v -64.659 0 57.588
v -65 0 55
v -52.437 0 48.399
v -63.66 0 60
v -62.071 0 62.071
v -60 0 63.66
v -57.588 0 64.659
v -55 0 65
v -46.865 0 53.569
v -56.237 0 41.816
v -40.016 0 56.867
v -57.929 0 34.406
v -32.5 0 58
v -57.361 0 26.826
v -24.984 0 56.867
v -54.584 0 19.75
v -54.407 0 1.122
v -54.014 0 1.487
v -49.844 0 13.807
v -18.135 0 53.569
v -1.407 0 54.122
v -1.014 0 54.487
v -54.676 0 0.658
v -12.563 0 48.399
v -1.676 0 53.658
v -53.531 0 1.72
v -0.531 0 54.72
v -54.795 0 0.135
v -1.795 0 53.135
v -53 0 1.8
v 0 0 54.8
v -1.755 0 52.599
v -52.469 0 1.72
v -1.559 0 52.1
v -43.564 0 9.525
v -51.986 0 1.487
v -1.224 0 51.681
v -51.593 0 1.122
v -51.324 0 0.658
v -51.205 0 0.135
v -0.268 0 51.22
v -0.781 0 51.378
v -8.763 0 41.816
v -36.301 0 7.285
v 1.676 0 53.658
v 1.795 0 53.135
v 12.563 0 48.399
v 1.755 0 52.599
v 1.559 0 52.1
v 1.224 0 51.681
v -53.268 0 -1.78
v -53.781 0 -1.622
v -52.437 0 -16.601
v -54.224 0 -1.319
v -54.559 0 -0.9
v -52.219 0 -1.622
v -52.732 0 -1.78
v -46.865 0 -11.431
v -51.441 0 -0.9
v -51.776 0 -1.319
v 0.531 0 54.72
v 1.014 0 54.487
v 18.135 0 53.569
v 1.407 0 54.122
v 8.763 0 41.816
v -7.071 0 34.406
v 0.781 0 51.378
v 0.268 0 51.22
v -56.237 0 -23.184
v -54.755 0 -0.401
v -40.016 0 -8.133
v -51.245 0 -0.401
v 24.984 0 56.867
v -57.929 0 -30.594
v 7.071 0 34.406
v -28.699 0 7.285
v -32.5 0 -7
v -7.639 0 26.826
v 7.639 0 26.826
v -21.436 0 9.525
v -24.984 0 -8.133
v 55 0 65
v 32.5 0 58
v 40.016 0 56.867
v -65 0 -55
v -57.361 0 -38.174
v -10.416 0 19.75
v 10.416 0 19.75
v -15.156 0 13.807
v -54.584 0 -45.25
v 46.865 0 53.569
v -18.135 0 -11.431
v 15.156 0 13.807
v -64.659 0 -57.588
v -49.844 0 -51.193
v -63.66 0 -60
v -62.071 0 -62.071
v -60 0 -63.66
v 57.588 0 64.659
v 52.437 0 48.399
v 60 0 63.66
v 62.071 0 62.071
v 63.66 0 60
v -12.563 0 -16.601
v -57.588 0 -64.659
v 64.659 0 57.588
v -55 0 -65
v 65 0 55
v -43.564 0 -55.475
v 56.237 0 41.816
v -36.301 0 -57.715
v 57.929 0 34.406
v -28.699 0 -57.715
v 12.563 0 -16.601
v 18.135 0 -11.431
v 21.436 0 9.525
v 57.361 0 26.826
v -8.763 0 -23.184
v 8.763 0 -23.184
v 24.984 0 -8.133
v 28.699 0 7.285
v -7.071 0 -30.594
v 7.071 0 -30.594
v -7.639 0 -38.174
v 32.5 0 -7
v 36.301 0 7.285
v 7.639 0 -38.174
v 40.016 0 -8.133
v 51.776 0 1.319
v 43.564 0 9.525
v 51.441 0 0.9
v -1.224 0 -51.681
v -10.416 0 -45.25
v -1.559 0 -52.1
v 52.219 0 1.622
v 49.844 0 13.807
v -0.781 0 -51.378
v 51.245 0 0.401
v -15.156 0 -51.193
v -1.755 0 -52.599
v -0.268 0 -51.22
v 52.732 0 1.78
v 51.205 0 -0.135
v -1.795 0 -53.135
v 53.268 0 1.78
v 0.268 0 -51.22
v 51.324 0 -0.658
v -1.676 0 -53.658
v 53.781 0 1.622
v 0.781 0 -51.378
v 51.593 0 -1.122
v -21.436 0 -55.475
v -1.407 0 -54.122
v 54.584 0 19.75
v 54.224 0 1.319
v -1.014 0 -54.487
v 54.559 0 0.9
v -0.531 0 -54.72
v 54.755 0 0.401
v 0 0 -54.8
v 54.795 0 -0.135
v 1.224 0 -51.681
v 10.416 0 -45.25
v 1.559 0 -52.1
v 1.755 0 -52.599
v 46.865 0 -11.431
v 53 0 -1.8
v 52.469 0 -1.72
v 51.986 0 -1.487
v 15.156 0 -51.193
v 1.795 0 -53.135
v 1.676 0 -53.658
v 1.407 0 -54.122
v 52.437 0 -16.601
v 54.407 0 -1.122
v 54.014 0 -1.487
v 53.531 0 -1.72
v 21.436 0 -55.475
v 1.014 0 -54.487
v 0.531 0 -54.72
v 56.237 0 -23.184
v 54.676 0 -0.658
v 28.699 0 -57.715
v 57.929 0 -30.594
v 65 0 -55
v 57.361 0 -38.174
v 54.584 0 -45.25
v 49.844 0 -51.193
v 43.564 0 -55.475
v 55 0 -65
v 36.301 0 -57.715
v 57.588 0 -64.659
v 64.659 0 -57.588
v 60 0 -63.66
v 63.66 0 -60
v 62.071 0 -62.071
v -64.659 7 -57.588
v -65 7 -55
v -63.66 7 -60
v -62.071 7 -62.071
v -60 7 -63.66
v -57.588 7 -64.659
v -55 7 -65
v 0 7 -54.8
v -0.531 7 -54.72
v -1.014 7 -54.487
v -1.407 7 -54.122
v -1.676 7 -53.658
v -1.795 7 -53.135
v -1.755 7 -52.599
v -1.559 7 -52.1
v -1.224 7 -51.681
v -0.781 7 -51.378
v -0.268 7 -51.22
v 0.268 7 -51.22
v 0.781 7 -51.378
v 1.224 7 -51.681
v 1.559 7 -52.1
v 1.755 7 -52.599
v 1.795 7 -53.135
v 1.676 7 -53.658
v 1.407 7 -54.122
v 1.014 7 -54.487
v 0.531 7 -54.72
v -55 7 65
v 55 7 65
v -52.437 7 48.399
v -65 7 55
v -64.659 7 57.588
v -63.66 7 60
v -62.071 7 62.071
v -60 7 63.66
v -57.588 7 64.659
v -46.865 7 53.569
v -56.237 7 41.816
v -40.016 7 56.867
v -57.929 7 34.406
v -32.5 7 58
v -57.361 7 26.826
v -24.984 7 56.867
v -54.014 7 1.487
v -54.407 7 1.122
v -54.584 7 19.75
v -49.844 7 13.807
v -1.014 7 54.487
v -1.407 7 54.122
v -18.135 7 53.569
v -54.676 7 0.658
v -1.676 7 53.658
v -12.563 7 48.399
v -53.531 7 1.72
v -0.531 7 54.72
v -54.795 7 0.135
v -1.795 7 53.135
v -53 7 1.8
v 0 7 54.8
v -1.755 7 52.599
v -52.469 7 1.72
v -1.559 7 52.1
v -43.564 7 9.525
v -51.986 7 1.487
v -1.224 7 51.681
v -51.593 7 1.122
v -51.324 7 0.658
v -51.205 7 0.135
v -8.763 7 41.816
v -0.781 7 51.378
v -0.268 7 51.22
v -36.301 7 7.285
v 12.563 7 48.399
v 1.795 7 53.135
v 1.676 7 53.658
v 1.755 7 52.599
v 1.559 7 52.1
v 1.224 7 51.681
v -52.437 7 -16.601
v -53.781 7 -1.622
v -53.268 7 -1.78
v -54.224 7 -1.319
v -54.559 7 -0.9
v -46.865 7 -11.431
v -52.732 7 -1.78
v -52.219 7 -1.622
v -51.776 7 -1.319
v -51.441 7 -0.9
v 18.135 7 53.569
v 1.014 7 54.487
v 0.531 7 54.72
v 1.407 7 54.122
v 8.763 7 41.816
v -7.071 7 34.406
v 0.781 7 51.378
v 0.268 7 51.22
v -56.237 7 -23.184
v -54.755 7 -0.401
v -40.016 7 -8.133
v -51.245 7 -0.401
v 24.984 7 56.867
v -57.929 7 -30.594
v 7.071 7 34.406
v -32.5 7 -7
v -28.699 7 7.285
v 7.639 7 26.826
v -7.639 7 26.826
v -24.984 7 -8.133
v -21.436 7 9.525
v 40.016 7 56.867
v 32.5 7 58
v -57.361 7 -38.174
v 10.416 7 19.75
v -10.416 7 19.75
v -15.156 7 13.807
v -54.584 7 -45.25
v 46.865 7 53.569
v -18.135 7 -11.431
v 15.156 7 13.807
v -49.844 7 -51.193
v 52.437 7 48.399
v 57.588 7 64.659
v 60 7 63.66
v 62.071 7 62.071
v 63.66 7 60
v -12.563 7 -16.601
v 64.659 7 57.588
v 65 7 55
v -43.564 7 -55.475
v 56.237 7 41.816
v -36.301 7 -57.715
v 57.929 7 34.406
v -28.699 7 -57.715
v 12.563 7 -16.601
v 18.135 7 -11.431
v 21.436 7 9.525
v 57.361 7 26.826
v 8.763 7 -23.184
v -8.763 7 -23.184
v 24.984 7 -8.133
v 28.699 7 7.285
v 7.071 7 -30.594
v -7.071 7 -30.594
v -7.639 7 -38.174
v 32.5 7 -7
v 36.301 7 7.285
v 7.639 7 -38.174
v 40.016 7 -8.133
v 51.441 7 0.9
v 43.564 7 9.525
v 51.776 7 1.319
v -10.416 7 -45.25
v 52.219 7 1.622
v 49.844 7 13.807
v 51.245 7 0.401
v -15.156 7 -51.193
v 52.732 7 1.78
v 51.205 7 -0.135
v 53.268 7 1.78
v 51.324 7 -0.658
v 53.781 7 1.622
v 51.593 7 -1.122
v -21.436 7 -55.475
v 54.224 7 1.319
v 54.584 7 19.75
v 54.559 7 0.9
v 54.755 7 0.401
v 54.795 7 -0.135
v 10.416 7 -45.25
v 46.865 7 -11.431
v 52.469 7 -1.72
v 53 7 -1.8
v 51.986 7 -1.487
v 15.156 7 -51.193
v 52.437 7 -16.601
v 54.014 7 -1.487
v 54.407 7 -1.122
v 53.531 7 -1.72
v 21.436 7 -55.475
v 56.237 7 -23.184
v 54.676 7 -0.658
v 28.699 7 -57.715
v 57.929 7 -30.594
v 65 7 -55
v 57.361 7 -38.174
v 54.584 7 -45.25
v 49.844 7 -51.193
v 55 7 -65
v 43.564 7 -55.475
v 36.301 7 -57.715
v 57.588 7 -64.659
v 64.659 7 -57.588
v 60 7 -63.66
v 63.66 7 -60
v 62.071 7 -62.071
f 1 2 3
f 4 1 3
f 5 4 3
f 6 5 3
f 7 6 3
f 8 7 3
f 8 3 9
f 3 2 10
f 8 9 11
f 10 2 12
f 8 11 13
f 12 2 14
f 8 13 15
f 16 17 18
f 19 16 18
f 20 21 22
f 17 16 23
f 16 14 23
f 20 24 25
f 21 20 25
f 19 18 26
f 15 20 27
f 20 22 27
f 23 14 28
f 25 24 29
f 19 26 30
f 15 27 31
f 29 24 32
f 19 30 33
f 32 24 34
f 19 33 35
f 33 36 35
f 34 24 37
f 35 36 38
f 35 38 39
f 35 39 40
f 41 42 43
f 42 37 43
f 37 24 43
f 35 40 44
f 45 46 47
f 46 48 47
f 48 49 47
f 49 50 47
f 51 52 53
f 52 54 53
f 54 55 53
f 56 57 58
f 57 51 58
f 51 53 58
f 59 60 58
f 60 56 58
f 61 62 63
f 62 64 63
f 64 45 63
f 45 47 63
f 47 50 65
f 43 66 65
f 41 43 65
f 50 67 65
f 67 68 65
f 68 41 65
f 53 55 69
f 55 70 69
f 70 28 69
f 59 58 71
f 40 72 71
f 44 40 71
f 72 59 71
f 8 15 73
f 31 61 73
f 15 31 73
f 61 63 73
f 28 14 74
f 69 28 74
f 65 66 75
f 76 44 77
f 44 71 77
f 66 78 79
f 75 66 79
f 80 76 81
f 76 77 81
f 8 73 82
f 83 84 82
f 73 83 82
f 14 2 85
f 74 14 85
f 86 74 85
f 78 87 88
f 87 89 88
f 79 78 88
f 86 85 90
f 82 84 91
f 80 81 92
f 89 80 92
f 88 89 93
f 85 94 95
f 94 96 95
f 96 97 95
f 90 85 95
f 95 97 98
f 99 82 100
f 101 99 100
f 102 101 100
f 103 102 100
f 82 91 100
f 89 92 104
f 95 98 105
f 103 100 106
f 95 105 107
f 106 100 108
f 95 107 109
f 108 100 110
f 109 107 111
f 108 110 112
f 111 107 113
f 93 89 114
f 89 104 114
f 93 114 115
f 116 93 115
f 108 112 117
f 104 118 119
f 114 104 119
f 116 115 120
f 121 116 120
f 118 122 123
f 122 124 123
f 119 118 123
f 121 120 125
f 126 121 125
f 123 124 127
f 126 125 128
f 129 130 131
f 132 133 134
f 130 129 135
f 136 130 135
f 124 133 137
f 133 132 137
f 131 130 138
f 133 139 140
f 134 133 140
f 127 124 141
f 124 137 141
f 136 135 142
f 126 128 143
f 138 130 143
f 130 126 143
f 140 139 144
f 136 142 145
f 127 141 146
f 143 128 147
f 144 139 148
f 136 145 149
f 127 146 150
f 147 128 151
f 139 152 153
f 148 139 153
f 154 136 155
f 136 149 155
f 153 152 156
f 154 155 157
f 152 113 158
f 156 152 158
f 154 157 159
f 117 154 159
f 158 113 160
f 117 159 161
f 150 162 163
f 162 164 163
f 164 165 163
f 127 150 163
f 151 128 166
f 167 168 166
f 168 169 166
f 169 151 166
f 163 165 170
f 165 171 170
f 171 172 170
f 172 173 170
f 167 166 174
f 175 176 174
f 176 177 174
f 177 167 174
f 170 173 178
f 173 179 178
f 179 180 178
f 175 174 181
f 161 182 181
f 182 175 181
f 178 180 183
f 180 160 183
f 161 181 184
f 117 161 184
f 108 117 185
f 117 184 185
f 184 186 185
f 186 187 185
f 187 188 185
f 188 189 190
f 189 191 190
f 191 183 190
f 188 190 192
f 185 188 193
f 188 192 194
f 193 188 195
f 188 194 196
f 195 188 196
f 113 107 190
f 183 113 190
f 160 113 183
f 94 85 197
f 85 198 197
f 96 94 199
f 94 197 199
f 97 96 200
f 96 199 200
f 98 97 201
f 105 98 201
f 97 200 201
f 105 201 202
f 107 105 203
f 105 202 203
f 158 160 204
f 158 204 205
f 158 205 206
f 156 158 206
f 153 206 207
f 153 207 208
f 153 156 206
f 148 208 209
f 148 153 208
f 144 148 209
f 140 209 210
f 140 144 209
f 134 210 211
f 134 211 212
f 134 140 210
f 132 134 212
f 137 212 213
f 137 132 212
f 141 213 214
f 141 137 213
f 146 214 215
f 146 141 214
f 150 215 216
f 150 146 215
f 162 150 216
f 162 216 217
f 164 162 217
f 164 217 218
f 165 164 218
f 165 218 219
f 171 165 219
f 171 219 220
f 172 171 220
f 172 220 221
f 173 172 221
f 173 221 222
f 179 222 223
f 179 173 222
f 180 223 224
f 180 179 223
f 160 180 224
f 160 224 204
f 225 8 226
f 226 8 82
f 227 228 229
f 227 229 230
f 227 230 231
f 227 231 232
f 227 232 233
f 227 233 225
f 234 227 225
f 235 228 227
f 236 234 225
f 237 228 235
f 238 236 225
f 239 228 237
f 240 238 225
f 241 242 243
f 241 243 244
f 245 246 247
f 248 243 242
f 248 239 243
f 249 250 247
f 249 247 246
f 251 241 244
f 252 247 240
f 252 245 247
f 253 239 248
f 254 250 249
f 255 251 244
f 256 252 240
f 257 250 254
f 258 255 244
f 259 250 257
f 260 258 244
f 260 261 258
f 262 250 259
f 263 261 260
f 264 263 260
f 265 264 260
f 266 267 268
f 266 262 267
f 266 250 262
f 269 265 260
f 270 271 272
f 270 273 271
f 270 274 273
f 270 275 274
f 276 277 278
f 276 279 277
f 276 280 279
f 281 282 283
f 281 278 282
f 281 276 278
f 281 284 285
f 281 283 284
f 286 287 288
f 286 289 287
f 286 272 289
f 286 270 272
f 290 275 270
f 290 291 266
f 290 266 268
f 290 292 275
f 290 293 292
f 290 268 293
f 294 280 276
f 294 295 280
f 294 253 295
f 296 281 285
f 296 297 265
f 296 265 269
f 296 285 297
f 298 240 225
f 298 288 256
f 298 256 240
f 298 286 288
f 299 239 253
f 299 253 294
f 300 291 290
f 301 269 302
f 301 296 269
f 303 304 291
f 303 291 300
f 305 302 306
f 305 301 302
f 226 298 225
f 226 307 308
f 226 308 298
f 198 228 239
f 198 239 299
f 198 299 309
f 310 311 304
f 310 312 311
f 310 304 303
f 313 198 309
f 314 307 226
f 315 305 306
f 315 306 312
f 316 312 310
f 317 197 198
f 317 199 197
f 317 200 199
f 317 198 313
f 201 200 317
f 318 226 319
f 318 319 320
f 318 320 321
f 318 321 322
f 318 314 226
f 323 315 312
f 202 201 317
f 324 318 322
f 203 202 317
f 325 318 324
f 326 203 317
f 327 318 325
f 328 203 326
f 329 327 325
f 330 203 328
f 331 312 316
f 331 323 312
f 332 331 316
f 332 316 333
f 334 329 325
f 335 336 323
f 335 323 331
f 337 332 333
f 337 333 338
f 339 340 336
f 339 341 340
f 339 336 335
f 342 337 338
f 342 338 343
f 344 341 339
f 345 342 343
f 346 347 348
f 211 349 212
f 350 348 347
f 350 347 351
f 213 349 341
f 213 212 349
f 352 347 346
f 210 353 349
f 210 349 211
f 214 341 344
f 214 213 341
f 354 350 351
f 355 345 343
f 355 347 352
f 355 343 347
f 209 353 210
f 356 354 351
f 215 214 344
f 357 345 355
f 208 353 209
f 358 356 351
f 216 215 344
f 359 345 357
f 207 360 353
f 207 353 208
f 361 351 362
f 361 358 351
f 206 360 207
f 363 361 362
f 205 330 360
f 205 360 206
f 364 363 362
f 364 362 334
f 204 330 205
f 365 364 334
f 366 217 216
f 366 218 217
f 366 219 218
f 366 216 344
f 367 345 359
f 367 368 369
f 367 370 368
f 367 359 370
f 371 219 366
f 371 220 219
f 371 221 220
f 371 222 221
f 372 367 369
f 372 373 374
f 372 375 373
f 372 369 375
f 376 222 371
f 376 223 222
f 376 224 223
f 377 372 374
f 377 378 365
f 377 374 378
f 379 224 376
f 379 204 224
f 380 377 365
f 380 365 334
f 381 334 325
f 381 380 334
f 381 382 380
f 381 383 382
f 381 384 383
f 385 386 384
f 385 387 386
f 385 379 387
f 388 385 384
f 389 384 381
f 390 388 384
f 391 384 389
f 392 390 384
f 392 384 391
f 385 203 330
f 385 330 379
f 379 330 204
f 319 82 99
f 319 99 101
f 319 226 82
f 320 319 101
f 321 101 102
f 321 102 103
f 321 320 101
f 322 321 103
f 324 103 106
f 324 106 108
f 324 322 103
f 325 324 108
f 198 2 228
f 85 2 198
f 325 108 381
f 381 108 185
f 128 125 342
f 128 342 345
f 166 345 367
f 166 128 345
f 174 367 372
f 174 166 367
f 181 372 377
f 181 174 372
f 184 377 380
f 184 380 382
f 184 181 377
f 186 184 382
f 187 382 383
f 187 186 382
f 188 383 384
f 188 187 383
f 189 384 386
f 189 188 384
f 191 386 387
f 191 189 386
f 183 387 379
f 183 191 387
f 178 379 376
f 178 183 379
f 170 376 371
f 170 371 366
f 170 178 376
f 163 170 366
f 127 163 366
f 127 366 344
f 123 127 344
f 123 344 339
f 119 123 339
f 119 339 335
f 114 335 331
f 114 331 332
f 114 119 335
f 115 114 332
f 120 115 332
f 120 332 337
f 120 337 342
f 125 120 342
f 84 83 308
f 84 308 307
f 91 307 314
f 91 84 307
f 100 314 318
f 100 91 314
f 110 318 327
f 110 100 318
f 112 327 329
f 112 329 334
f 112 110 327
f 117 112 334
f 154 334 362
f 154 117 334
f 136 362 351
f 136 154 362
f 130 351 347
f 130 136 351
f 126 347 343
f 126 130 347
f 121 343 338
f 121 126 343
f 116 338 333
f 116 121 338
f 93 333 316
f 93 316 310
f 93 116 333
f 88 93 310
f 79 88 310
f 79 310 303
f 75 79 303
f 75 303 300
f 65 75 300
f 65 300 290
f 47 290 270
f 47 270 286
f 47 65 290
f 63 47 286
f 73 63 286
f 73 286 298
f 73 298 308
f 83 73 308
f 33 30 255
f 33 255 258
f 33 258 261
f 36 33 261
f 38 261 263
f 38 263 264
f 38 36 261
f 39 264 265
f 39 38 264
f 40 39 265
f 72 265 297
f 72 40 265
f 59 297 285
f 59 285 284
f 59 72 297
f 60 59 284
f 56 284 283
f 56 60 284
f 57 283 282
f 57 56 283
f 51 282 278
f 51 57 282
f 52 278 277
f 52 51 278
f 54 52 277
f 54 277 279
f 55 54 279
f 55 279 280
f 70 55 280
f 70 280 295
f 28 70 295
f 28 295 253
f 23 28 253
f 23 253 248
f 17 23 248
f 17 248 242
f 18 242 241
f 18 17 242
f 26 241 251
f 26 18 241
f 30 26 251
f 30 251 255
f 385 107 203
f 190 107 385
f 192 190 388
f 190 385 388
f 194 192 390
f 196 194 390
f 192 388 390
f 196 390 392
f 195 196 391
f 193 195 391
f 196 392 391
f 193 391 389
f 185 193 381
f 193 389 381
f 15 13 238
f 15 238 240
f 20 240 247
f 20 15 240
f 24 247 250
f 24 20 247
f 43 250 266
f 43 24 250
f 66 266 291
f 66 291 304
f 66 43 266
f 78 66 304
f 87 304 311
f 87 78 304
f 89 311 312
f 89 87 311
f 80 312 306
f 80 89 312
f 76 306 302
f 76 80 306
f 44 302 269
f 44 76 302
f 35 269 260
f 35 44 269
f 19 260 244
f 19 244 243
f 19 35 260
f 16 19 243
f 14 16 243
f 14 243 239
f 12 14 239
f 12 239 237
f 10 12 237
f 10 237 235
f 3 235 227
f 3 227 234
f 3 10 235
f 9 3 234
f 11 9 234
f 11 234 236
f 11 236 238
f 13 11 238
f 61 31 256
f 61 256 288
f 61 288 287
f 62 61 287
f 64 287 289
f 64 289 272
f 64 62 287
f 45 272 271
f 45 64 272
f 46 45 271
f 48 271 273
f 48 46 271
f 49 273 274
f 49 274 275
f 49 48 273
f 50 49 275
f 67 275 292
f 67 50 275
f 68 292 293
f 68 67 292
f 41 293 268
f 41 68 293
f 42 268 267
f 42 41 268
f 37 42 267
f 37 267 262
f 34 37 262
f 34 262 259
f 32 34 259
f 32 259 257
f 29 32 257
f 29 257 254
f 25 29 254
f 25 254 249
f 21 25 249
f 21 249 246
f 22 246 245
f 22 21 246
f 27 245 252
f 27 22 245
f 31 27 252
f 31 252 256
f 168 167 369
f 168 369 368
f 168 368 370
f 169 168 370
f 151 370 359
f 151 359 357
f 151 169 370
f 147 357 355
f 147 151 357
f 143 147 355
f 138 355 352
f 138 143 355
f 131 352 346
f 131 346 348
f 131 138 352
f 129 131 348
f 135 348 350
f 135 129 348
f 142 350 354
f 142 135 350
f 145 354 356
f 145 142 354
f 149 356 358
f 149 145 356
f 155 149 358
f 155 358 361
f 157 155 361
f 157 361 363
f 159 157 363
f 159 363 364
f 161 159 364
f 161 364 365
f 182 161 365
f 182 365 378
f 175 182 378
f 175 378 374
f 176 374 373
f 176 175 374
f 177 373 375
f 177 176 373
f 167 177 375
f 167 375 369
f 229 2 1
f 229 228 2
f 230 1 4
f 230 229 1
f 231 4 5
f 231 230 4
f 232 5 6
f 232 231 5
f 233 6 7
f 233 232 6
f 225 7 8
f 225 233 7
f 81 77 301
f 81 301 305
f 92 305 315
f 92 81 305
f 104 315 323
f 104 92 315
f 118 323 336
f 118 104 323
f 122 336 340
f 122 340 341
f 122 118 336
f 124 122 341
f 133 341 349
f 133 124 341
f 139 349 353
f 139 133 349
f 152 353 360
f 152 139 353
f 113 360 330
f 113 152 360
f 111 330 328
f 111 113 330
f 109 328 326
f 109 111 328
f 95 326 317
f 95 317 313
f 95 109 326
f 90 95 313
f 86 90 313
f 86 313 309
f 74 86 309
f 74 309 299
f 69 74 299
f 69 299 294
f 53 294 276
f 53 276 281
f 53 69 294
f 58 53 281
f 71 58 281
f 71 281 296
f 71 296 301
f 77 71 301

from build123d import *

# Parameters (mm, degrees)
SKETCH1_W           = 130
SKETCH1_H           = 130
SKETCH1_R           = 25.5
SKETCH1_R_2         = 1.8
BOSS_EXTRUDE1_DEPTH = 7
FILLET1_R           = 10


with BuildPart() as part:
    # Sketch1 → Boss-Extrude1 (new body)
    with BuildSketch(Plane(origin=(0, 0, 0), x_dir=(1, 0, 0), z_dir=(0, 1, 0))):
        Rectangle(SKETCH1_W, SKETCH1_H)
        with Locations(Location((-32.5, 32.5, 0), (0, 0, 270))):
            Circle(SKETCH1_R, mode=Mode.SUBTRACT)
        with Locations(Location((32.5, 32.5, 0), (0, 0, 270))):
            Circle(SKETCH1_R, mode=Mode.SUBTRACT)
        with Locations(Location((-32.5, -32.5, 0), (0, 0, 270))):
            Circle(SKETCH1_R, mode=Mode.SUBTRACT)
        with Locations(Location((32.5, -32.5, 0), (0, 0, 270))):
            Circle(SKETCH1_R, mode=Mode.SUBTRACT)
        with Locations(Location((0, -53, 0), (0, 0, 270))):
            Circle(SKETCH1_R_2, mode=Mode.SUBTRACT)
        with Locations(Location((-53, 0, 0), (0, 0, 270))):
            Circle(SKETCH1_R_2, mode=Mode.SUBTRACT)
        with Locations(Location((0, 53, 0), (0, 0, 90))):
            Circle(SKETCH1_R_2, mode=Mode.SUBTRACT)
        with Locations(Location((53, 0, 0), (0, 0, 90))):
            Circle(SKETCH1_R_2, mode=Mode.SUBTRACT)
    extrude(amount=BOSS_EXTRUDE1_DEPTH)

    # Fillet1
    fillet1_edges = [part.edges().sort_by_distance(p)[0] for p in [
        (-65, 3.5, -65),
        (65, 3.5, -65),
        (65, 3.5, 65),
        (-65, 3.5, 65),
    ]]
    fillet(fillet1_edges, radius=FILLET1_R)


solid = part.part
